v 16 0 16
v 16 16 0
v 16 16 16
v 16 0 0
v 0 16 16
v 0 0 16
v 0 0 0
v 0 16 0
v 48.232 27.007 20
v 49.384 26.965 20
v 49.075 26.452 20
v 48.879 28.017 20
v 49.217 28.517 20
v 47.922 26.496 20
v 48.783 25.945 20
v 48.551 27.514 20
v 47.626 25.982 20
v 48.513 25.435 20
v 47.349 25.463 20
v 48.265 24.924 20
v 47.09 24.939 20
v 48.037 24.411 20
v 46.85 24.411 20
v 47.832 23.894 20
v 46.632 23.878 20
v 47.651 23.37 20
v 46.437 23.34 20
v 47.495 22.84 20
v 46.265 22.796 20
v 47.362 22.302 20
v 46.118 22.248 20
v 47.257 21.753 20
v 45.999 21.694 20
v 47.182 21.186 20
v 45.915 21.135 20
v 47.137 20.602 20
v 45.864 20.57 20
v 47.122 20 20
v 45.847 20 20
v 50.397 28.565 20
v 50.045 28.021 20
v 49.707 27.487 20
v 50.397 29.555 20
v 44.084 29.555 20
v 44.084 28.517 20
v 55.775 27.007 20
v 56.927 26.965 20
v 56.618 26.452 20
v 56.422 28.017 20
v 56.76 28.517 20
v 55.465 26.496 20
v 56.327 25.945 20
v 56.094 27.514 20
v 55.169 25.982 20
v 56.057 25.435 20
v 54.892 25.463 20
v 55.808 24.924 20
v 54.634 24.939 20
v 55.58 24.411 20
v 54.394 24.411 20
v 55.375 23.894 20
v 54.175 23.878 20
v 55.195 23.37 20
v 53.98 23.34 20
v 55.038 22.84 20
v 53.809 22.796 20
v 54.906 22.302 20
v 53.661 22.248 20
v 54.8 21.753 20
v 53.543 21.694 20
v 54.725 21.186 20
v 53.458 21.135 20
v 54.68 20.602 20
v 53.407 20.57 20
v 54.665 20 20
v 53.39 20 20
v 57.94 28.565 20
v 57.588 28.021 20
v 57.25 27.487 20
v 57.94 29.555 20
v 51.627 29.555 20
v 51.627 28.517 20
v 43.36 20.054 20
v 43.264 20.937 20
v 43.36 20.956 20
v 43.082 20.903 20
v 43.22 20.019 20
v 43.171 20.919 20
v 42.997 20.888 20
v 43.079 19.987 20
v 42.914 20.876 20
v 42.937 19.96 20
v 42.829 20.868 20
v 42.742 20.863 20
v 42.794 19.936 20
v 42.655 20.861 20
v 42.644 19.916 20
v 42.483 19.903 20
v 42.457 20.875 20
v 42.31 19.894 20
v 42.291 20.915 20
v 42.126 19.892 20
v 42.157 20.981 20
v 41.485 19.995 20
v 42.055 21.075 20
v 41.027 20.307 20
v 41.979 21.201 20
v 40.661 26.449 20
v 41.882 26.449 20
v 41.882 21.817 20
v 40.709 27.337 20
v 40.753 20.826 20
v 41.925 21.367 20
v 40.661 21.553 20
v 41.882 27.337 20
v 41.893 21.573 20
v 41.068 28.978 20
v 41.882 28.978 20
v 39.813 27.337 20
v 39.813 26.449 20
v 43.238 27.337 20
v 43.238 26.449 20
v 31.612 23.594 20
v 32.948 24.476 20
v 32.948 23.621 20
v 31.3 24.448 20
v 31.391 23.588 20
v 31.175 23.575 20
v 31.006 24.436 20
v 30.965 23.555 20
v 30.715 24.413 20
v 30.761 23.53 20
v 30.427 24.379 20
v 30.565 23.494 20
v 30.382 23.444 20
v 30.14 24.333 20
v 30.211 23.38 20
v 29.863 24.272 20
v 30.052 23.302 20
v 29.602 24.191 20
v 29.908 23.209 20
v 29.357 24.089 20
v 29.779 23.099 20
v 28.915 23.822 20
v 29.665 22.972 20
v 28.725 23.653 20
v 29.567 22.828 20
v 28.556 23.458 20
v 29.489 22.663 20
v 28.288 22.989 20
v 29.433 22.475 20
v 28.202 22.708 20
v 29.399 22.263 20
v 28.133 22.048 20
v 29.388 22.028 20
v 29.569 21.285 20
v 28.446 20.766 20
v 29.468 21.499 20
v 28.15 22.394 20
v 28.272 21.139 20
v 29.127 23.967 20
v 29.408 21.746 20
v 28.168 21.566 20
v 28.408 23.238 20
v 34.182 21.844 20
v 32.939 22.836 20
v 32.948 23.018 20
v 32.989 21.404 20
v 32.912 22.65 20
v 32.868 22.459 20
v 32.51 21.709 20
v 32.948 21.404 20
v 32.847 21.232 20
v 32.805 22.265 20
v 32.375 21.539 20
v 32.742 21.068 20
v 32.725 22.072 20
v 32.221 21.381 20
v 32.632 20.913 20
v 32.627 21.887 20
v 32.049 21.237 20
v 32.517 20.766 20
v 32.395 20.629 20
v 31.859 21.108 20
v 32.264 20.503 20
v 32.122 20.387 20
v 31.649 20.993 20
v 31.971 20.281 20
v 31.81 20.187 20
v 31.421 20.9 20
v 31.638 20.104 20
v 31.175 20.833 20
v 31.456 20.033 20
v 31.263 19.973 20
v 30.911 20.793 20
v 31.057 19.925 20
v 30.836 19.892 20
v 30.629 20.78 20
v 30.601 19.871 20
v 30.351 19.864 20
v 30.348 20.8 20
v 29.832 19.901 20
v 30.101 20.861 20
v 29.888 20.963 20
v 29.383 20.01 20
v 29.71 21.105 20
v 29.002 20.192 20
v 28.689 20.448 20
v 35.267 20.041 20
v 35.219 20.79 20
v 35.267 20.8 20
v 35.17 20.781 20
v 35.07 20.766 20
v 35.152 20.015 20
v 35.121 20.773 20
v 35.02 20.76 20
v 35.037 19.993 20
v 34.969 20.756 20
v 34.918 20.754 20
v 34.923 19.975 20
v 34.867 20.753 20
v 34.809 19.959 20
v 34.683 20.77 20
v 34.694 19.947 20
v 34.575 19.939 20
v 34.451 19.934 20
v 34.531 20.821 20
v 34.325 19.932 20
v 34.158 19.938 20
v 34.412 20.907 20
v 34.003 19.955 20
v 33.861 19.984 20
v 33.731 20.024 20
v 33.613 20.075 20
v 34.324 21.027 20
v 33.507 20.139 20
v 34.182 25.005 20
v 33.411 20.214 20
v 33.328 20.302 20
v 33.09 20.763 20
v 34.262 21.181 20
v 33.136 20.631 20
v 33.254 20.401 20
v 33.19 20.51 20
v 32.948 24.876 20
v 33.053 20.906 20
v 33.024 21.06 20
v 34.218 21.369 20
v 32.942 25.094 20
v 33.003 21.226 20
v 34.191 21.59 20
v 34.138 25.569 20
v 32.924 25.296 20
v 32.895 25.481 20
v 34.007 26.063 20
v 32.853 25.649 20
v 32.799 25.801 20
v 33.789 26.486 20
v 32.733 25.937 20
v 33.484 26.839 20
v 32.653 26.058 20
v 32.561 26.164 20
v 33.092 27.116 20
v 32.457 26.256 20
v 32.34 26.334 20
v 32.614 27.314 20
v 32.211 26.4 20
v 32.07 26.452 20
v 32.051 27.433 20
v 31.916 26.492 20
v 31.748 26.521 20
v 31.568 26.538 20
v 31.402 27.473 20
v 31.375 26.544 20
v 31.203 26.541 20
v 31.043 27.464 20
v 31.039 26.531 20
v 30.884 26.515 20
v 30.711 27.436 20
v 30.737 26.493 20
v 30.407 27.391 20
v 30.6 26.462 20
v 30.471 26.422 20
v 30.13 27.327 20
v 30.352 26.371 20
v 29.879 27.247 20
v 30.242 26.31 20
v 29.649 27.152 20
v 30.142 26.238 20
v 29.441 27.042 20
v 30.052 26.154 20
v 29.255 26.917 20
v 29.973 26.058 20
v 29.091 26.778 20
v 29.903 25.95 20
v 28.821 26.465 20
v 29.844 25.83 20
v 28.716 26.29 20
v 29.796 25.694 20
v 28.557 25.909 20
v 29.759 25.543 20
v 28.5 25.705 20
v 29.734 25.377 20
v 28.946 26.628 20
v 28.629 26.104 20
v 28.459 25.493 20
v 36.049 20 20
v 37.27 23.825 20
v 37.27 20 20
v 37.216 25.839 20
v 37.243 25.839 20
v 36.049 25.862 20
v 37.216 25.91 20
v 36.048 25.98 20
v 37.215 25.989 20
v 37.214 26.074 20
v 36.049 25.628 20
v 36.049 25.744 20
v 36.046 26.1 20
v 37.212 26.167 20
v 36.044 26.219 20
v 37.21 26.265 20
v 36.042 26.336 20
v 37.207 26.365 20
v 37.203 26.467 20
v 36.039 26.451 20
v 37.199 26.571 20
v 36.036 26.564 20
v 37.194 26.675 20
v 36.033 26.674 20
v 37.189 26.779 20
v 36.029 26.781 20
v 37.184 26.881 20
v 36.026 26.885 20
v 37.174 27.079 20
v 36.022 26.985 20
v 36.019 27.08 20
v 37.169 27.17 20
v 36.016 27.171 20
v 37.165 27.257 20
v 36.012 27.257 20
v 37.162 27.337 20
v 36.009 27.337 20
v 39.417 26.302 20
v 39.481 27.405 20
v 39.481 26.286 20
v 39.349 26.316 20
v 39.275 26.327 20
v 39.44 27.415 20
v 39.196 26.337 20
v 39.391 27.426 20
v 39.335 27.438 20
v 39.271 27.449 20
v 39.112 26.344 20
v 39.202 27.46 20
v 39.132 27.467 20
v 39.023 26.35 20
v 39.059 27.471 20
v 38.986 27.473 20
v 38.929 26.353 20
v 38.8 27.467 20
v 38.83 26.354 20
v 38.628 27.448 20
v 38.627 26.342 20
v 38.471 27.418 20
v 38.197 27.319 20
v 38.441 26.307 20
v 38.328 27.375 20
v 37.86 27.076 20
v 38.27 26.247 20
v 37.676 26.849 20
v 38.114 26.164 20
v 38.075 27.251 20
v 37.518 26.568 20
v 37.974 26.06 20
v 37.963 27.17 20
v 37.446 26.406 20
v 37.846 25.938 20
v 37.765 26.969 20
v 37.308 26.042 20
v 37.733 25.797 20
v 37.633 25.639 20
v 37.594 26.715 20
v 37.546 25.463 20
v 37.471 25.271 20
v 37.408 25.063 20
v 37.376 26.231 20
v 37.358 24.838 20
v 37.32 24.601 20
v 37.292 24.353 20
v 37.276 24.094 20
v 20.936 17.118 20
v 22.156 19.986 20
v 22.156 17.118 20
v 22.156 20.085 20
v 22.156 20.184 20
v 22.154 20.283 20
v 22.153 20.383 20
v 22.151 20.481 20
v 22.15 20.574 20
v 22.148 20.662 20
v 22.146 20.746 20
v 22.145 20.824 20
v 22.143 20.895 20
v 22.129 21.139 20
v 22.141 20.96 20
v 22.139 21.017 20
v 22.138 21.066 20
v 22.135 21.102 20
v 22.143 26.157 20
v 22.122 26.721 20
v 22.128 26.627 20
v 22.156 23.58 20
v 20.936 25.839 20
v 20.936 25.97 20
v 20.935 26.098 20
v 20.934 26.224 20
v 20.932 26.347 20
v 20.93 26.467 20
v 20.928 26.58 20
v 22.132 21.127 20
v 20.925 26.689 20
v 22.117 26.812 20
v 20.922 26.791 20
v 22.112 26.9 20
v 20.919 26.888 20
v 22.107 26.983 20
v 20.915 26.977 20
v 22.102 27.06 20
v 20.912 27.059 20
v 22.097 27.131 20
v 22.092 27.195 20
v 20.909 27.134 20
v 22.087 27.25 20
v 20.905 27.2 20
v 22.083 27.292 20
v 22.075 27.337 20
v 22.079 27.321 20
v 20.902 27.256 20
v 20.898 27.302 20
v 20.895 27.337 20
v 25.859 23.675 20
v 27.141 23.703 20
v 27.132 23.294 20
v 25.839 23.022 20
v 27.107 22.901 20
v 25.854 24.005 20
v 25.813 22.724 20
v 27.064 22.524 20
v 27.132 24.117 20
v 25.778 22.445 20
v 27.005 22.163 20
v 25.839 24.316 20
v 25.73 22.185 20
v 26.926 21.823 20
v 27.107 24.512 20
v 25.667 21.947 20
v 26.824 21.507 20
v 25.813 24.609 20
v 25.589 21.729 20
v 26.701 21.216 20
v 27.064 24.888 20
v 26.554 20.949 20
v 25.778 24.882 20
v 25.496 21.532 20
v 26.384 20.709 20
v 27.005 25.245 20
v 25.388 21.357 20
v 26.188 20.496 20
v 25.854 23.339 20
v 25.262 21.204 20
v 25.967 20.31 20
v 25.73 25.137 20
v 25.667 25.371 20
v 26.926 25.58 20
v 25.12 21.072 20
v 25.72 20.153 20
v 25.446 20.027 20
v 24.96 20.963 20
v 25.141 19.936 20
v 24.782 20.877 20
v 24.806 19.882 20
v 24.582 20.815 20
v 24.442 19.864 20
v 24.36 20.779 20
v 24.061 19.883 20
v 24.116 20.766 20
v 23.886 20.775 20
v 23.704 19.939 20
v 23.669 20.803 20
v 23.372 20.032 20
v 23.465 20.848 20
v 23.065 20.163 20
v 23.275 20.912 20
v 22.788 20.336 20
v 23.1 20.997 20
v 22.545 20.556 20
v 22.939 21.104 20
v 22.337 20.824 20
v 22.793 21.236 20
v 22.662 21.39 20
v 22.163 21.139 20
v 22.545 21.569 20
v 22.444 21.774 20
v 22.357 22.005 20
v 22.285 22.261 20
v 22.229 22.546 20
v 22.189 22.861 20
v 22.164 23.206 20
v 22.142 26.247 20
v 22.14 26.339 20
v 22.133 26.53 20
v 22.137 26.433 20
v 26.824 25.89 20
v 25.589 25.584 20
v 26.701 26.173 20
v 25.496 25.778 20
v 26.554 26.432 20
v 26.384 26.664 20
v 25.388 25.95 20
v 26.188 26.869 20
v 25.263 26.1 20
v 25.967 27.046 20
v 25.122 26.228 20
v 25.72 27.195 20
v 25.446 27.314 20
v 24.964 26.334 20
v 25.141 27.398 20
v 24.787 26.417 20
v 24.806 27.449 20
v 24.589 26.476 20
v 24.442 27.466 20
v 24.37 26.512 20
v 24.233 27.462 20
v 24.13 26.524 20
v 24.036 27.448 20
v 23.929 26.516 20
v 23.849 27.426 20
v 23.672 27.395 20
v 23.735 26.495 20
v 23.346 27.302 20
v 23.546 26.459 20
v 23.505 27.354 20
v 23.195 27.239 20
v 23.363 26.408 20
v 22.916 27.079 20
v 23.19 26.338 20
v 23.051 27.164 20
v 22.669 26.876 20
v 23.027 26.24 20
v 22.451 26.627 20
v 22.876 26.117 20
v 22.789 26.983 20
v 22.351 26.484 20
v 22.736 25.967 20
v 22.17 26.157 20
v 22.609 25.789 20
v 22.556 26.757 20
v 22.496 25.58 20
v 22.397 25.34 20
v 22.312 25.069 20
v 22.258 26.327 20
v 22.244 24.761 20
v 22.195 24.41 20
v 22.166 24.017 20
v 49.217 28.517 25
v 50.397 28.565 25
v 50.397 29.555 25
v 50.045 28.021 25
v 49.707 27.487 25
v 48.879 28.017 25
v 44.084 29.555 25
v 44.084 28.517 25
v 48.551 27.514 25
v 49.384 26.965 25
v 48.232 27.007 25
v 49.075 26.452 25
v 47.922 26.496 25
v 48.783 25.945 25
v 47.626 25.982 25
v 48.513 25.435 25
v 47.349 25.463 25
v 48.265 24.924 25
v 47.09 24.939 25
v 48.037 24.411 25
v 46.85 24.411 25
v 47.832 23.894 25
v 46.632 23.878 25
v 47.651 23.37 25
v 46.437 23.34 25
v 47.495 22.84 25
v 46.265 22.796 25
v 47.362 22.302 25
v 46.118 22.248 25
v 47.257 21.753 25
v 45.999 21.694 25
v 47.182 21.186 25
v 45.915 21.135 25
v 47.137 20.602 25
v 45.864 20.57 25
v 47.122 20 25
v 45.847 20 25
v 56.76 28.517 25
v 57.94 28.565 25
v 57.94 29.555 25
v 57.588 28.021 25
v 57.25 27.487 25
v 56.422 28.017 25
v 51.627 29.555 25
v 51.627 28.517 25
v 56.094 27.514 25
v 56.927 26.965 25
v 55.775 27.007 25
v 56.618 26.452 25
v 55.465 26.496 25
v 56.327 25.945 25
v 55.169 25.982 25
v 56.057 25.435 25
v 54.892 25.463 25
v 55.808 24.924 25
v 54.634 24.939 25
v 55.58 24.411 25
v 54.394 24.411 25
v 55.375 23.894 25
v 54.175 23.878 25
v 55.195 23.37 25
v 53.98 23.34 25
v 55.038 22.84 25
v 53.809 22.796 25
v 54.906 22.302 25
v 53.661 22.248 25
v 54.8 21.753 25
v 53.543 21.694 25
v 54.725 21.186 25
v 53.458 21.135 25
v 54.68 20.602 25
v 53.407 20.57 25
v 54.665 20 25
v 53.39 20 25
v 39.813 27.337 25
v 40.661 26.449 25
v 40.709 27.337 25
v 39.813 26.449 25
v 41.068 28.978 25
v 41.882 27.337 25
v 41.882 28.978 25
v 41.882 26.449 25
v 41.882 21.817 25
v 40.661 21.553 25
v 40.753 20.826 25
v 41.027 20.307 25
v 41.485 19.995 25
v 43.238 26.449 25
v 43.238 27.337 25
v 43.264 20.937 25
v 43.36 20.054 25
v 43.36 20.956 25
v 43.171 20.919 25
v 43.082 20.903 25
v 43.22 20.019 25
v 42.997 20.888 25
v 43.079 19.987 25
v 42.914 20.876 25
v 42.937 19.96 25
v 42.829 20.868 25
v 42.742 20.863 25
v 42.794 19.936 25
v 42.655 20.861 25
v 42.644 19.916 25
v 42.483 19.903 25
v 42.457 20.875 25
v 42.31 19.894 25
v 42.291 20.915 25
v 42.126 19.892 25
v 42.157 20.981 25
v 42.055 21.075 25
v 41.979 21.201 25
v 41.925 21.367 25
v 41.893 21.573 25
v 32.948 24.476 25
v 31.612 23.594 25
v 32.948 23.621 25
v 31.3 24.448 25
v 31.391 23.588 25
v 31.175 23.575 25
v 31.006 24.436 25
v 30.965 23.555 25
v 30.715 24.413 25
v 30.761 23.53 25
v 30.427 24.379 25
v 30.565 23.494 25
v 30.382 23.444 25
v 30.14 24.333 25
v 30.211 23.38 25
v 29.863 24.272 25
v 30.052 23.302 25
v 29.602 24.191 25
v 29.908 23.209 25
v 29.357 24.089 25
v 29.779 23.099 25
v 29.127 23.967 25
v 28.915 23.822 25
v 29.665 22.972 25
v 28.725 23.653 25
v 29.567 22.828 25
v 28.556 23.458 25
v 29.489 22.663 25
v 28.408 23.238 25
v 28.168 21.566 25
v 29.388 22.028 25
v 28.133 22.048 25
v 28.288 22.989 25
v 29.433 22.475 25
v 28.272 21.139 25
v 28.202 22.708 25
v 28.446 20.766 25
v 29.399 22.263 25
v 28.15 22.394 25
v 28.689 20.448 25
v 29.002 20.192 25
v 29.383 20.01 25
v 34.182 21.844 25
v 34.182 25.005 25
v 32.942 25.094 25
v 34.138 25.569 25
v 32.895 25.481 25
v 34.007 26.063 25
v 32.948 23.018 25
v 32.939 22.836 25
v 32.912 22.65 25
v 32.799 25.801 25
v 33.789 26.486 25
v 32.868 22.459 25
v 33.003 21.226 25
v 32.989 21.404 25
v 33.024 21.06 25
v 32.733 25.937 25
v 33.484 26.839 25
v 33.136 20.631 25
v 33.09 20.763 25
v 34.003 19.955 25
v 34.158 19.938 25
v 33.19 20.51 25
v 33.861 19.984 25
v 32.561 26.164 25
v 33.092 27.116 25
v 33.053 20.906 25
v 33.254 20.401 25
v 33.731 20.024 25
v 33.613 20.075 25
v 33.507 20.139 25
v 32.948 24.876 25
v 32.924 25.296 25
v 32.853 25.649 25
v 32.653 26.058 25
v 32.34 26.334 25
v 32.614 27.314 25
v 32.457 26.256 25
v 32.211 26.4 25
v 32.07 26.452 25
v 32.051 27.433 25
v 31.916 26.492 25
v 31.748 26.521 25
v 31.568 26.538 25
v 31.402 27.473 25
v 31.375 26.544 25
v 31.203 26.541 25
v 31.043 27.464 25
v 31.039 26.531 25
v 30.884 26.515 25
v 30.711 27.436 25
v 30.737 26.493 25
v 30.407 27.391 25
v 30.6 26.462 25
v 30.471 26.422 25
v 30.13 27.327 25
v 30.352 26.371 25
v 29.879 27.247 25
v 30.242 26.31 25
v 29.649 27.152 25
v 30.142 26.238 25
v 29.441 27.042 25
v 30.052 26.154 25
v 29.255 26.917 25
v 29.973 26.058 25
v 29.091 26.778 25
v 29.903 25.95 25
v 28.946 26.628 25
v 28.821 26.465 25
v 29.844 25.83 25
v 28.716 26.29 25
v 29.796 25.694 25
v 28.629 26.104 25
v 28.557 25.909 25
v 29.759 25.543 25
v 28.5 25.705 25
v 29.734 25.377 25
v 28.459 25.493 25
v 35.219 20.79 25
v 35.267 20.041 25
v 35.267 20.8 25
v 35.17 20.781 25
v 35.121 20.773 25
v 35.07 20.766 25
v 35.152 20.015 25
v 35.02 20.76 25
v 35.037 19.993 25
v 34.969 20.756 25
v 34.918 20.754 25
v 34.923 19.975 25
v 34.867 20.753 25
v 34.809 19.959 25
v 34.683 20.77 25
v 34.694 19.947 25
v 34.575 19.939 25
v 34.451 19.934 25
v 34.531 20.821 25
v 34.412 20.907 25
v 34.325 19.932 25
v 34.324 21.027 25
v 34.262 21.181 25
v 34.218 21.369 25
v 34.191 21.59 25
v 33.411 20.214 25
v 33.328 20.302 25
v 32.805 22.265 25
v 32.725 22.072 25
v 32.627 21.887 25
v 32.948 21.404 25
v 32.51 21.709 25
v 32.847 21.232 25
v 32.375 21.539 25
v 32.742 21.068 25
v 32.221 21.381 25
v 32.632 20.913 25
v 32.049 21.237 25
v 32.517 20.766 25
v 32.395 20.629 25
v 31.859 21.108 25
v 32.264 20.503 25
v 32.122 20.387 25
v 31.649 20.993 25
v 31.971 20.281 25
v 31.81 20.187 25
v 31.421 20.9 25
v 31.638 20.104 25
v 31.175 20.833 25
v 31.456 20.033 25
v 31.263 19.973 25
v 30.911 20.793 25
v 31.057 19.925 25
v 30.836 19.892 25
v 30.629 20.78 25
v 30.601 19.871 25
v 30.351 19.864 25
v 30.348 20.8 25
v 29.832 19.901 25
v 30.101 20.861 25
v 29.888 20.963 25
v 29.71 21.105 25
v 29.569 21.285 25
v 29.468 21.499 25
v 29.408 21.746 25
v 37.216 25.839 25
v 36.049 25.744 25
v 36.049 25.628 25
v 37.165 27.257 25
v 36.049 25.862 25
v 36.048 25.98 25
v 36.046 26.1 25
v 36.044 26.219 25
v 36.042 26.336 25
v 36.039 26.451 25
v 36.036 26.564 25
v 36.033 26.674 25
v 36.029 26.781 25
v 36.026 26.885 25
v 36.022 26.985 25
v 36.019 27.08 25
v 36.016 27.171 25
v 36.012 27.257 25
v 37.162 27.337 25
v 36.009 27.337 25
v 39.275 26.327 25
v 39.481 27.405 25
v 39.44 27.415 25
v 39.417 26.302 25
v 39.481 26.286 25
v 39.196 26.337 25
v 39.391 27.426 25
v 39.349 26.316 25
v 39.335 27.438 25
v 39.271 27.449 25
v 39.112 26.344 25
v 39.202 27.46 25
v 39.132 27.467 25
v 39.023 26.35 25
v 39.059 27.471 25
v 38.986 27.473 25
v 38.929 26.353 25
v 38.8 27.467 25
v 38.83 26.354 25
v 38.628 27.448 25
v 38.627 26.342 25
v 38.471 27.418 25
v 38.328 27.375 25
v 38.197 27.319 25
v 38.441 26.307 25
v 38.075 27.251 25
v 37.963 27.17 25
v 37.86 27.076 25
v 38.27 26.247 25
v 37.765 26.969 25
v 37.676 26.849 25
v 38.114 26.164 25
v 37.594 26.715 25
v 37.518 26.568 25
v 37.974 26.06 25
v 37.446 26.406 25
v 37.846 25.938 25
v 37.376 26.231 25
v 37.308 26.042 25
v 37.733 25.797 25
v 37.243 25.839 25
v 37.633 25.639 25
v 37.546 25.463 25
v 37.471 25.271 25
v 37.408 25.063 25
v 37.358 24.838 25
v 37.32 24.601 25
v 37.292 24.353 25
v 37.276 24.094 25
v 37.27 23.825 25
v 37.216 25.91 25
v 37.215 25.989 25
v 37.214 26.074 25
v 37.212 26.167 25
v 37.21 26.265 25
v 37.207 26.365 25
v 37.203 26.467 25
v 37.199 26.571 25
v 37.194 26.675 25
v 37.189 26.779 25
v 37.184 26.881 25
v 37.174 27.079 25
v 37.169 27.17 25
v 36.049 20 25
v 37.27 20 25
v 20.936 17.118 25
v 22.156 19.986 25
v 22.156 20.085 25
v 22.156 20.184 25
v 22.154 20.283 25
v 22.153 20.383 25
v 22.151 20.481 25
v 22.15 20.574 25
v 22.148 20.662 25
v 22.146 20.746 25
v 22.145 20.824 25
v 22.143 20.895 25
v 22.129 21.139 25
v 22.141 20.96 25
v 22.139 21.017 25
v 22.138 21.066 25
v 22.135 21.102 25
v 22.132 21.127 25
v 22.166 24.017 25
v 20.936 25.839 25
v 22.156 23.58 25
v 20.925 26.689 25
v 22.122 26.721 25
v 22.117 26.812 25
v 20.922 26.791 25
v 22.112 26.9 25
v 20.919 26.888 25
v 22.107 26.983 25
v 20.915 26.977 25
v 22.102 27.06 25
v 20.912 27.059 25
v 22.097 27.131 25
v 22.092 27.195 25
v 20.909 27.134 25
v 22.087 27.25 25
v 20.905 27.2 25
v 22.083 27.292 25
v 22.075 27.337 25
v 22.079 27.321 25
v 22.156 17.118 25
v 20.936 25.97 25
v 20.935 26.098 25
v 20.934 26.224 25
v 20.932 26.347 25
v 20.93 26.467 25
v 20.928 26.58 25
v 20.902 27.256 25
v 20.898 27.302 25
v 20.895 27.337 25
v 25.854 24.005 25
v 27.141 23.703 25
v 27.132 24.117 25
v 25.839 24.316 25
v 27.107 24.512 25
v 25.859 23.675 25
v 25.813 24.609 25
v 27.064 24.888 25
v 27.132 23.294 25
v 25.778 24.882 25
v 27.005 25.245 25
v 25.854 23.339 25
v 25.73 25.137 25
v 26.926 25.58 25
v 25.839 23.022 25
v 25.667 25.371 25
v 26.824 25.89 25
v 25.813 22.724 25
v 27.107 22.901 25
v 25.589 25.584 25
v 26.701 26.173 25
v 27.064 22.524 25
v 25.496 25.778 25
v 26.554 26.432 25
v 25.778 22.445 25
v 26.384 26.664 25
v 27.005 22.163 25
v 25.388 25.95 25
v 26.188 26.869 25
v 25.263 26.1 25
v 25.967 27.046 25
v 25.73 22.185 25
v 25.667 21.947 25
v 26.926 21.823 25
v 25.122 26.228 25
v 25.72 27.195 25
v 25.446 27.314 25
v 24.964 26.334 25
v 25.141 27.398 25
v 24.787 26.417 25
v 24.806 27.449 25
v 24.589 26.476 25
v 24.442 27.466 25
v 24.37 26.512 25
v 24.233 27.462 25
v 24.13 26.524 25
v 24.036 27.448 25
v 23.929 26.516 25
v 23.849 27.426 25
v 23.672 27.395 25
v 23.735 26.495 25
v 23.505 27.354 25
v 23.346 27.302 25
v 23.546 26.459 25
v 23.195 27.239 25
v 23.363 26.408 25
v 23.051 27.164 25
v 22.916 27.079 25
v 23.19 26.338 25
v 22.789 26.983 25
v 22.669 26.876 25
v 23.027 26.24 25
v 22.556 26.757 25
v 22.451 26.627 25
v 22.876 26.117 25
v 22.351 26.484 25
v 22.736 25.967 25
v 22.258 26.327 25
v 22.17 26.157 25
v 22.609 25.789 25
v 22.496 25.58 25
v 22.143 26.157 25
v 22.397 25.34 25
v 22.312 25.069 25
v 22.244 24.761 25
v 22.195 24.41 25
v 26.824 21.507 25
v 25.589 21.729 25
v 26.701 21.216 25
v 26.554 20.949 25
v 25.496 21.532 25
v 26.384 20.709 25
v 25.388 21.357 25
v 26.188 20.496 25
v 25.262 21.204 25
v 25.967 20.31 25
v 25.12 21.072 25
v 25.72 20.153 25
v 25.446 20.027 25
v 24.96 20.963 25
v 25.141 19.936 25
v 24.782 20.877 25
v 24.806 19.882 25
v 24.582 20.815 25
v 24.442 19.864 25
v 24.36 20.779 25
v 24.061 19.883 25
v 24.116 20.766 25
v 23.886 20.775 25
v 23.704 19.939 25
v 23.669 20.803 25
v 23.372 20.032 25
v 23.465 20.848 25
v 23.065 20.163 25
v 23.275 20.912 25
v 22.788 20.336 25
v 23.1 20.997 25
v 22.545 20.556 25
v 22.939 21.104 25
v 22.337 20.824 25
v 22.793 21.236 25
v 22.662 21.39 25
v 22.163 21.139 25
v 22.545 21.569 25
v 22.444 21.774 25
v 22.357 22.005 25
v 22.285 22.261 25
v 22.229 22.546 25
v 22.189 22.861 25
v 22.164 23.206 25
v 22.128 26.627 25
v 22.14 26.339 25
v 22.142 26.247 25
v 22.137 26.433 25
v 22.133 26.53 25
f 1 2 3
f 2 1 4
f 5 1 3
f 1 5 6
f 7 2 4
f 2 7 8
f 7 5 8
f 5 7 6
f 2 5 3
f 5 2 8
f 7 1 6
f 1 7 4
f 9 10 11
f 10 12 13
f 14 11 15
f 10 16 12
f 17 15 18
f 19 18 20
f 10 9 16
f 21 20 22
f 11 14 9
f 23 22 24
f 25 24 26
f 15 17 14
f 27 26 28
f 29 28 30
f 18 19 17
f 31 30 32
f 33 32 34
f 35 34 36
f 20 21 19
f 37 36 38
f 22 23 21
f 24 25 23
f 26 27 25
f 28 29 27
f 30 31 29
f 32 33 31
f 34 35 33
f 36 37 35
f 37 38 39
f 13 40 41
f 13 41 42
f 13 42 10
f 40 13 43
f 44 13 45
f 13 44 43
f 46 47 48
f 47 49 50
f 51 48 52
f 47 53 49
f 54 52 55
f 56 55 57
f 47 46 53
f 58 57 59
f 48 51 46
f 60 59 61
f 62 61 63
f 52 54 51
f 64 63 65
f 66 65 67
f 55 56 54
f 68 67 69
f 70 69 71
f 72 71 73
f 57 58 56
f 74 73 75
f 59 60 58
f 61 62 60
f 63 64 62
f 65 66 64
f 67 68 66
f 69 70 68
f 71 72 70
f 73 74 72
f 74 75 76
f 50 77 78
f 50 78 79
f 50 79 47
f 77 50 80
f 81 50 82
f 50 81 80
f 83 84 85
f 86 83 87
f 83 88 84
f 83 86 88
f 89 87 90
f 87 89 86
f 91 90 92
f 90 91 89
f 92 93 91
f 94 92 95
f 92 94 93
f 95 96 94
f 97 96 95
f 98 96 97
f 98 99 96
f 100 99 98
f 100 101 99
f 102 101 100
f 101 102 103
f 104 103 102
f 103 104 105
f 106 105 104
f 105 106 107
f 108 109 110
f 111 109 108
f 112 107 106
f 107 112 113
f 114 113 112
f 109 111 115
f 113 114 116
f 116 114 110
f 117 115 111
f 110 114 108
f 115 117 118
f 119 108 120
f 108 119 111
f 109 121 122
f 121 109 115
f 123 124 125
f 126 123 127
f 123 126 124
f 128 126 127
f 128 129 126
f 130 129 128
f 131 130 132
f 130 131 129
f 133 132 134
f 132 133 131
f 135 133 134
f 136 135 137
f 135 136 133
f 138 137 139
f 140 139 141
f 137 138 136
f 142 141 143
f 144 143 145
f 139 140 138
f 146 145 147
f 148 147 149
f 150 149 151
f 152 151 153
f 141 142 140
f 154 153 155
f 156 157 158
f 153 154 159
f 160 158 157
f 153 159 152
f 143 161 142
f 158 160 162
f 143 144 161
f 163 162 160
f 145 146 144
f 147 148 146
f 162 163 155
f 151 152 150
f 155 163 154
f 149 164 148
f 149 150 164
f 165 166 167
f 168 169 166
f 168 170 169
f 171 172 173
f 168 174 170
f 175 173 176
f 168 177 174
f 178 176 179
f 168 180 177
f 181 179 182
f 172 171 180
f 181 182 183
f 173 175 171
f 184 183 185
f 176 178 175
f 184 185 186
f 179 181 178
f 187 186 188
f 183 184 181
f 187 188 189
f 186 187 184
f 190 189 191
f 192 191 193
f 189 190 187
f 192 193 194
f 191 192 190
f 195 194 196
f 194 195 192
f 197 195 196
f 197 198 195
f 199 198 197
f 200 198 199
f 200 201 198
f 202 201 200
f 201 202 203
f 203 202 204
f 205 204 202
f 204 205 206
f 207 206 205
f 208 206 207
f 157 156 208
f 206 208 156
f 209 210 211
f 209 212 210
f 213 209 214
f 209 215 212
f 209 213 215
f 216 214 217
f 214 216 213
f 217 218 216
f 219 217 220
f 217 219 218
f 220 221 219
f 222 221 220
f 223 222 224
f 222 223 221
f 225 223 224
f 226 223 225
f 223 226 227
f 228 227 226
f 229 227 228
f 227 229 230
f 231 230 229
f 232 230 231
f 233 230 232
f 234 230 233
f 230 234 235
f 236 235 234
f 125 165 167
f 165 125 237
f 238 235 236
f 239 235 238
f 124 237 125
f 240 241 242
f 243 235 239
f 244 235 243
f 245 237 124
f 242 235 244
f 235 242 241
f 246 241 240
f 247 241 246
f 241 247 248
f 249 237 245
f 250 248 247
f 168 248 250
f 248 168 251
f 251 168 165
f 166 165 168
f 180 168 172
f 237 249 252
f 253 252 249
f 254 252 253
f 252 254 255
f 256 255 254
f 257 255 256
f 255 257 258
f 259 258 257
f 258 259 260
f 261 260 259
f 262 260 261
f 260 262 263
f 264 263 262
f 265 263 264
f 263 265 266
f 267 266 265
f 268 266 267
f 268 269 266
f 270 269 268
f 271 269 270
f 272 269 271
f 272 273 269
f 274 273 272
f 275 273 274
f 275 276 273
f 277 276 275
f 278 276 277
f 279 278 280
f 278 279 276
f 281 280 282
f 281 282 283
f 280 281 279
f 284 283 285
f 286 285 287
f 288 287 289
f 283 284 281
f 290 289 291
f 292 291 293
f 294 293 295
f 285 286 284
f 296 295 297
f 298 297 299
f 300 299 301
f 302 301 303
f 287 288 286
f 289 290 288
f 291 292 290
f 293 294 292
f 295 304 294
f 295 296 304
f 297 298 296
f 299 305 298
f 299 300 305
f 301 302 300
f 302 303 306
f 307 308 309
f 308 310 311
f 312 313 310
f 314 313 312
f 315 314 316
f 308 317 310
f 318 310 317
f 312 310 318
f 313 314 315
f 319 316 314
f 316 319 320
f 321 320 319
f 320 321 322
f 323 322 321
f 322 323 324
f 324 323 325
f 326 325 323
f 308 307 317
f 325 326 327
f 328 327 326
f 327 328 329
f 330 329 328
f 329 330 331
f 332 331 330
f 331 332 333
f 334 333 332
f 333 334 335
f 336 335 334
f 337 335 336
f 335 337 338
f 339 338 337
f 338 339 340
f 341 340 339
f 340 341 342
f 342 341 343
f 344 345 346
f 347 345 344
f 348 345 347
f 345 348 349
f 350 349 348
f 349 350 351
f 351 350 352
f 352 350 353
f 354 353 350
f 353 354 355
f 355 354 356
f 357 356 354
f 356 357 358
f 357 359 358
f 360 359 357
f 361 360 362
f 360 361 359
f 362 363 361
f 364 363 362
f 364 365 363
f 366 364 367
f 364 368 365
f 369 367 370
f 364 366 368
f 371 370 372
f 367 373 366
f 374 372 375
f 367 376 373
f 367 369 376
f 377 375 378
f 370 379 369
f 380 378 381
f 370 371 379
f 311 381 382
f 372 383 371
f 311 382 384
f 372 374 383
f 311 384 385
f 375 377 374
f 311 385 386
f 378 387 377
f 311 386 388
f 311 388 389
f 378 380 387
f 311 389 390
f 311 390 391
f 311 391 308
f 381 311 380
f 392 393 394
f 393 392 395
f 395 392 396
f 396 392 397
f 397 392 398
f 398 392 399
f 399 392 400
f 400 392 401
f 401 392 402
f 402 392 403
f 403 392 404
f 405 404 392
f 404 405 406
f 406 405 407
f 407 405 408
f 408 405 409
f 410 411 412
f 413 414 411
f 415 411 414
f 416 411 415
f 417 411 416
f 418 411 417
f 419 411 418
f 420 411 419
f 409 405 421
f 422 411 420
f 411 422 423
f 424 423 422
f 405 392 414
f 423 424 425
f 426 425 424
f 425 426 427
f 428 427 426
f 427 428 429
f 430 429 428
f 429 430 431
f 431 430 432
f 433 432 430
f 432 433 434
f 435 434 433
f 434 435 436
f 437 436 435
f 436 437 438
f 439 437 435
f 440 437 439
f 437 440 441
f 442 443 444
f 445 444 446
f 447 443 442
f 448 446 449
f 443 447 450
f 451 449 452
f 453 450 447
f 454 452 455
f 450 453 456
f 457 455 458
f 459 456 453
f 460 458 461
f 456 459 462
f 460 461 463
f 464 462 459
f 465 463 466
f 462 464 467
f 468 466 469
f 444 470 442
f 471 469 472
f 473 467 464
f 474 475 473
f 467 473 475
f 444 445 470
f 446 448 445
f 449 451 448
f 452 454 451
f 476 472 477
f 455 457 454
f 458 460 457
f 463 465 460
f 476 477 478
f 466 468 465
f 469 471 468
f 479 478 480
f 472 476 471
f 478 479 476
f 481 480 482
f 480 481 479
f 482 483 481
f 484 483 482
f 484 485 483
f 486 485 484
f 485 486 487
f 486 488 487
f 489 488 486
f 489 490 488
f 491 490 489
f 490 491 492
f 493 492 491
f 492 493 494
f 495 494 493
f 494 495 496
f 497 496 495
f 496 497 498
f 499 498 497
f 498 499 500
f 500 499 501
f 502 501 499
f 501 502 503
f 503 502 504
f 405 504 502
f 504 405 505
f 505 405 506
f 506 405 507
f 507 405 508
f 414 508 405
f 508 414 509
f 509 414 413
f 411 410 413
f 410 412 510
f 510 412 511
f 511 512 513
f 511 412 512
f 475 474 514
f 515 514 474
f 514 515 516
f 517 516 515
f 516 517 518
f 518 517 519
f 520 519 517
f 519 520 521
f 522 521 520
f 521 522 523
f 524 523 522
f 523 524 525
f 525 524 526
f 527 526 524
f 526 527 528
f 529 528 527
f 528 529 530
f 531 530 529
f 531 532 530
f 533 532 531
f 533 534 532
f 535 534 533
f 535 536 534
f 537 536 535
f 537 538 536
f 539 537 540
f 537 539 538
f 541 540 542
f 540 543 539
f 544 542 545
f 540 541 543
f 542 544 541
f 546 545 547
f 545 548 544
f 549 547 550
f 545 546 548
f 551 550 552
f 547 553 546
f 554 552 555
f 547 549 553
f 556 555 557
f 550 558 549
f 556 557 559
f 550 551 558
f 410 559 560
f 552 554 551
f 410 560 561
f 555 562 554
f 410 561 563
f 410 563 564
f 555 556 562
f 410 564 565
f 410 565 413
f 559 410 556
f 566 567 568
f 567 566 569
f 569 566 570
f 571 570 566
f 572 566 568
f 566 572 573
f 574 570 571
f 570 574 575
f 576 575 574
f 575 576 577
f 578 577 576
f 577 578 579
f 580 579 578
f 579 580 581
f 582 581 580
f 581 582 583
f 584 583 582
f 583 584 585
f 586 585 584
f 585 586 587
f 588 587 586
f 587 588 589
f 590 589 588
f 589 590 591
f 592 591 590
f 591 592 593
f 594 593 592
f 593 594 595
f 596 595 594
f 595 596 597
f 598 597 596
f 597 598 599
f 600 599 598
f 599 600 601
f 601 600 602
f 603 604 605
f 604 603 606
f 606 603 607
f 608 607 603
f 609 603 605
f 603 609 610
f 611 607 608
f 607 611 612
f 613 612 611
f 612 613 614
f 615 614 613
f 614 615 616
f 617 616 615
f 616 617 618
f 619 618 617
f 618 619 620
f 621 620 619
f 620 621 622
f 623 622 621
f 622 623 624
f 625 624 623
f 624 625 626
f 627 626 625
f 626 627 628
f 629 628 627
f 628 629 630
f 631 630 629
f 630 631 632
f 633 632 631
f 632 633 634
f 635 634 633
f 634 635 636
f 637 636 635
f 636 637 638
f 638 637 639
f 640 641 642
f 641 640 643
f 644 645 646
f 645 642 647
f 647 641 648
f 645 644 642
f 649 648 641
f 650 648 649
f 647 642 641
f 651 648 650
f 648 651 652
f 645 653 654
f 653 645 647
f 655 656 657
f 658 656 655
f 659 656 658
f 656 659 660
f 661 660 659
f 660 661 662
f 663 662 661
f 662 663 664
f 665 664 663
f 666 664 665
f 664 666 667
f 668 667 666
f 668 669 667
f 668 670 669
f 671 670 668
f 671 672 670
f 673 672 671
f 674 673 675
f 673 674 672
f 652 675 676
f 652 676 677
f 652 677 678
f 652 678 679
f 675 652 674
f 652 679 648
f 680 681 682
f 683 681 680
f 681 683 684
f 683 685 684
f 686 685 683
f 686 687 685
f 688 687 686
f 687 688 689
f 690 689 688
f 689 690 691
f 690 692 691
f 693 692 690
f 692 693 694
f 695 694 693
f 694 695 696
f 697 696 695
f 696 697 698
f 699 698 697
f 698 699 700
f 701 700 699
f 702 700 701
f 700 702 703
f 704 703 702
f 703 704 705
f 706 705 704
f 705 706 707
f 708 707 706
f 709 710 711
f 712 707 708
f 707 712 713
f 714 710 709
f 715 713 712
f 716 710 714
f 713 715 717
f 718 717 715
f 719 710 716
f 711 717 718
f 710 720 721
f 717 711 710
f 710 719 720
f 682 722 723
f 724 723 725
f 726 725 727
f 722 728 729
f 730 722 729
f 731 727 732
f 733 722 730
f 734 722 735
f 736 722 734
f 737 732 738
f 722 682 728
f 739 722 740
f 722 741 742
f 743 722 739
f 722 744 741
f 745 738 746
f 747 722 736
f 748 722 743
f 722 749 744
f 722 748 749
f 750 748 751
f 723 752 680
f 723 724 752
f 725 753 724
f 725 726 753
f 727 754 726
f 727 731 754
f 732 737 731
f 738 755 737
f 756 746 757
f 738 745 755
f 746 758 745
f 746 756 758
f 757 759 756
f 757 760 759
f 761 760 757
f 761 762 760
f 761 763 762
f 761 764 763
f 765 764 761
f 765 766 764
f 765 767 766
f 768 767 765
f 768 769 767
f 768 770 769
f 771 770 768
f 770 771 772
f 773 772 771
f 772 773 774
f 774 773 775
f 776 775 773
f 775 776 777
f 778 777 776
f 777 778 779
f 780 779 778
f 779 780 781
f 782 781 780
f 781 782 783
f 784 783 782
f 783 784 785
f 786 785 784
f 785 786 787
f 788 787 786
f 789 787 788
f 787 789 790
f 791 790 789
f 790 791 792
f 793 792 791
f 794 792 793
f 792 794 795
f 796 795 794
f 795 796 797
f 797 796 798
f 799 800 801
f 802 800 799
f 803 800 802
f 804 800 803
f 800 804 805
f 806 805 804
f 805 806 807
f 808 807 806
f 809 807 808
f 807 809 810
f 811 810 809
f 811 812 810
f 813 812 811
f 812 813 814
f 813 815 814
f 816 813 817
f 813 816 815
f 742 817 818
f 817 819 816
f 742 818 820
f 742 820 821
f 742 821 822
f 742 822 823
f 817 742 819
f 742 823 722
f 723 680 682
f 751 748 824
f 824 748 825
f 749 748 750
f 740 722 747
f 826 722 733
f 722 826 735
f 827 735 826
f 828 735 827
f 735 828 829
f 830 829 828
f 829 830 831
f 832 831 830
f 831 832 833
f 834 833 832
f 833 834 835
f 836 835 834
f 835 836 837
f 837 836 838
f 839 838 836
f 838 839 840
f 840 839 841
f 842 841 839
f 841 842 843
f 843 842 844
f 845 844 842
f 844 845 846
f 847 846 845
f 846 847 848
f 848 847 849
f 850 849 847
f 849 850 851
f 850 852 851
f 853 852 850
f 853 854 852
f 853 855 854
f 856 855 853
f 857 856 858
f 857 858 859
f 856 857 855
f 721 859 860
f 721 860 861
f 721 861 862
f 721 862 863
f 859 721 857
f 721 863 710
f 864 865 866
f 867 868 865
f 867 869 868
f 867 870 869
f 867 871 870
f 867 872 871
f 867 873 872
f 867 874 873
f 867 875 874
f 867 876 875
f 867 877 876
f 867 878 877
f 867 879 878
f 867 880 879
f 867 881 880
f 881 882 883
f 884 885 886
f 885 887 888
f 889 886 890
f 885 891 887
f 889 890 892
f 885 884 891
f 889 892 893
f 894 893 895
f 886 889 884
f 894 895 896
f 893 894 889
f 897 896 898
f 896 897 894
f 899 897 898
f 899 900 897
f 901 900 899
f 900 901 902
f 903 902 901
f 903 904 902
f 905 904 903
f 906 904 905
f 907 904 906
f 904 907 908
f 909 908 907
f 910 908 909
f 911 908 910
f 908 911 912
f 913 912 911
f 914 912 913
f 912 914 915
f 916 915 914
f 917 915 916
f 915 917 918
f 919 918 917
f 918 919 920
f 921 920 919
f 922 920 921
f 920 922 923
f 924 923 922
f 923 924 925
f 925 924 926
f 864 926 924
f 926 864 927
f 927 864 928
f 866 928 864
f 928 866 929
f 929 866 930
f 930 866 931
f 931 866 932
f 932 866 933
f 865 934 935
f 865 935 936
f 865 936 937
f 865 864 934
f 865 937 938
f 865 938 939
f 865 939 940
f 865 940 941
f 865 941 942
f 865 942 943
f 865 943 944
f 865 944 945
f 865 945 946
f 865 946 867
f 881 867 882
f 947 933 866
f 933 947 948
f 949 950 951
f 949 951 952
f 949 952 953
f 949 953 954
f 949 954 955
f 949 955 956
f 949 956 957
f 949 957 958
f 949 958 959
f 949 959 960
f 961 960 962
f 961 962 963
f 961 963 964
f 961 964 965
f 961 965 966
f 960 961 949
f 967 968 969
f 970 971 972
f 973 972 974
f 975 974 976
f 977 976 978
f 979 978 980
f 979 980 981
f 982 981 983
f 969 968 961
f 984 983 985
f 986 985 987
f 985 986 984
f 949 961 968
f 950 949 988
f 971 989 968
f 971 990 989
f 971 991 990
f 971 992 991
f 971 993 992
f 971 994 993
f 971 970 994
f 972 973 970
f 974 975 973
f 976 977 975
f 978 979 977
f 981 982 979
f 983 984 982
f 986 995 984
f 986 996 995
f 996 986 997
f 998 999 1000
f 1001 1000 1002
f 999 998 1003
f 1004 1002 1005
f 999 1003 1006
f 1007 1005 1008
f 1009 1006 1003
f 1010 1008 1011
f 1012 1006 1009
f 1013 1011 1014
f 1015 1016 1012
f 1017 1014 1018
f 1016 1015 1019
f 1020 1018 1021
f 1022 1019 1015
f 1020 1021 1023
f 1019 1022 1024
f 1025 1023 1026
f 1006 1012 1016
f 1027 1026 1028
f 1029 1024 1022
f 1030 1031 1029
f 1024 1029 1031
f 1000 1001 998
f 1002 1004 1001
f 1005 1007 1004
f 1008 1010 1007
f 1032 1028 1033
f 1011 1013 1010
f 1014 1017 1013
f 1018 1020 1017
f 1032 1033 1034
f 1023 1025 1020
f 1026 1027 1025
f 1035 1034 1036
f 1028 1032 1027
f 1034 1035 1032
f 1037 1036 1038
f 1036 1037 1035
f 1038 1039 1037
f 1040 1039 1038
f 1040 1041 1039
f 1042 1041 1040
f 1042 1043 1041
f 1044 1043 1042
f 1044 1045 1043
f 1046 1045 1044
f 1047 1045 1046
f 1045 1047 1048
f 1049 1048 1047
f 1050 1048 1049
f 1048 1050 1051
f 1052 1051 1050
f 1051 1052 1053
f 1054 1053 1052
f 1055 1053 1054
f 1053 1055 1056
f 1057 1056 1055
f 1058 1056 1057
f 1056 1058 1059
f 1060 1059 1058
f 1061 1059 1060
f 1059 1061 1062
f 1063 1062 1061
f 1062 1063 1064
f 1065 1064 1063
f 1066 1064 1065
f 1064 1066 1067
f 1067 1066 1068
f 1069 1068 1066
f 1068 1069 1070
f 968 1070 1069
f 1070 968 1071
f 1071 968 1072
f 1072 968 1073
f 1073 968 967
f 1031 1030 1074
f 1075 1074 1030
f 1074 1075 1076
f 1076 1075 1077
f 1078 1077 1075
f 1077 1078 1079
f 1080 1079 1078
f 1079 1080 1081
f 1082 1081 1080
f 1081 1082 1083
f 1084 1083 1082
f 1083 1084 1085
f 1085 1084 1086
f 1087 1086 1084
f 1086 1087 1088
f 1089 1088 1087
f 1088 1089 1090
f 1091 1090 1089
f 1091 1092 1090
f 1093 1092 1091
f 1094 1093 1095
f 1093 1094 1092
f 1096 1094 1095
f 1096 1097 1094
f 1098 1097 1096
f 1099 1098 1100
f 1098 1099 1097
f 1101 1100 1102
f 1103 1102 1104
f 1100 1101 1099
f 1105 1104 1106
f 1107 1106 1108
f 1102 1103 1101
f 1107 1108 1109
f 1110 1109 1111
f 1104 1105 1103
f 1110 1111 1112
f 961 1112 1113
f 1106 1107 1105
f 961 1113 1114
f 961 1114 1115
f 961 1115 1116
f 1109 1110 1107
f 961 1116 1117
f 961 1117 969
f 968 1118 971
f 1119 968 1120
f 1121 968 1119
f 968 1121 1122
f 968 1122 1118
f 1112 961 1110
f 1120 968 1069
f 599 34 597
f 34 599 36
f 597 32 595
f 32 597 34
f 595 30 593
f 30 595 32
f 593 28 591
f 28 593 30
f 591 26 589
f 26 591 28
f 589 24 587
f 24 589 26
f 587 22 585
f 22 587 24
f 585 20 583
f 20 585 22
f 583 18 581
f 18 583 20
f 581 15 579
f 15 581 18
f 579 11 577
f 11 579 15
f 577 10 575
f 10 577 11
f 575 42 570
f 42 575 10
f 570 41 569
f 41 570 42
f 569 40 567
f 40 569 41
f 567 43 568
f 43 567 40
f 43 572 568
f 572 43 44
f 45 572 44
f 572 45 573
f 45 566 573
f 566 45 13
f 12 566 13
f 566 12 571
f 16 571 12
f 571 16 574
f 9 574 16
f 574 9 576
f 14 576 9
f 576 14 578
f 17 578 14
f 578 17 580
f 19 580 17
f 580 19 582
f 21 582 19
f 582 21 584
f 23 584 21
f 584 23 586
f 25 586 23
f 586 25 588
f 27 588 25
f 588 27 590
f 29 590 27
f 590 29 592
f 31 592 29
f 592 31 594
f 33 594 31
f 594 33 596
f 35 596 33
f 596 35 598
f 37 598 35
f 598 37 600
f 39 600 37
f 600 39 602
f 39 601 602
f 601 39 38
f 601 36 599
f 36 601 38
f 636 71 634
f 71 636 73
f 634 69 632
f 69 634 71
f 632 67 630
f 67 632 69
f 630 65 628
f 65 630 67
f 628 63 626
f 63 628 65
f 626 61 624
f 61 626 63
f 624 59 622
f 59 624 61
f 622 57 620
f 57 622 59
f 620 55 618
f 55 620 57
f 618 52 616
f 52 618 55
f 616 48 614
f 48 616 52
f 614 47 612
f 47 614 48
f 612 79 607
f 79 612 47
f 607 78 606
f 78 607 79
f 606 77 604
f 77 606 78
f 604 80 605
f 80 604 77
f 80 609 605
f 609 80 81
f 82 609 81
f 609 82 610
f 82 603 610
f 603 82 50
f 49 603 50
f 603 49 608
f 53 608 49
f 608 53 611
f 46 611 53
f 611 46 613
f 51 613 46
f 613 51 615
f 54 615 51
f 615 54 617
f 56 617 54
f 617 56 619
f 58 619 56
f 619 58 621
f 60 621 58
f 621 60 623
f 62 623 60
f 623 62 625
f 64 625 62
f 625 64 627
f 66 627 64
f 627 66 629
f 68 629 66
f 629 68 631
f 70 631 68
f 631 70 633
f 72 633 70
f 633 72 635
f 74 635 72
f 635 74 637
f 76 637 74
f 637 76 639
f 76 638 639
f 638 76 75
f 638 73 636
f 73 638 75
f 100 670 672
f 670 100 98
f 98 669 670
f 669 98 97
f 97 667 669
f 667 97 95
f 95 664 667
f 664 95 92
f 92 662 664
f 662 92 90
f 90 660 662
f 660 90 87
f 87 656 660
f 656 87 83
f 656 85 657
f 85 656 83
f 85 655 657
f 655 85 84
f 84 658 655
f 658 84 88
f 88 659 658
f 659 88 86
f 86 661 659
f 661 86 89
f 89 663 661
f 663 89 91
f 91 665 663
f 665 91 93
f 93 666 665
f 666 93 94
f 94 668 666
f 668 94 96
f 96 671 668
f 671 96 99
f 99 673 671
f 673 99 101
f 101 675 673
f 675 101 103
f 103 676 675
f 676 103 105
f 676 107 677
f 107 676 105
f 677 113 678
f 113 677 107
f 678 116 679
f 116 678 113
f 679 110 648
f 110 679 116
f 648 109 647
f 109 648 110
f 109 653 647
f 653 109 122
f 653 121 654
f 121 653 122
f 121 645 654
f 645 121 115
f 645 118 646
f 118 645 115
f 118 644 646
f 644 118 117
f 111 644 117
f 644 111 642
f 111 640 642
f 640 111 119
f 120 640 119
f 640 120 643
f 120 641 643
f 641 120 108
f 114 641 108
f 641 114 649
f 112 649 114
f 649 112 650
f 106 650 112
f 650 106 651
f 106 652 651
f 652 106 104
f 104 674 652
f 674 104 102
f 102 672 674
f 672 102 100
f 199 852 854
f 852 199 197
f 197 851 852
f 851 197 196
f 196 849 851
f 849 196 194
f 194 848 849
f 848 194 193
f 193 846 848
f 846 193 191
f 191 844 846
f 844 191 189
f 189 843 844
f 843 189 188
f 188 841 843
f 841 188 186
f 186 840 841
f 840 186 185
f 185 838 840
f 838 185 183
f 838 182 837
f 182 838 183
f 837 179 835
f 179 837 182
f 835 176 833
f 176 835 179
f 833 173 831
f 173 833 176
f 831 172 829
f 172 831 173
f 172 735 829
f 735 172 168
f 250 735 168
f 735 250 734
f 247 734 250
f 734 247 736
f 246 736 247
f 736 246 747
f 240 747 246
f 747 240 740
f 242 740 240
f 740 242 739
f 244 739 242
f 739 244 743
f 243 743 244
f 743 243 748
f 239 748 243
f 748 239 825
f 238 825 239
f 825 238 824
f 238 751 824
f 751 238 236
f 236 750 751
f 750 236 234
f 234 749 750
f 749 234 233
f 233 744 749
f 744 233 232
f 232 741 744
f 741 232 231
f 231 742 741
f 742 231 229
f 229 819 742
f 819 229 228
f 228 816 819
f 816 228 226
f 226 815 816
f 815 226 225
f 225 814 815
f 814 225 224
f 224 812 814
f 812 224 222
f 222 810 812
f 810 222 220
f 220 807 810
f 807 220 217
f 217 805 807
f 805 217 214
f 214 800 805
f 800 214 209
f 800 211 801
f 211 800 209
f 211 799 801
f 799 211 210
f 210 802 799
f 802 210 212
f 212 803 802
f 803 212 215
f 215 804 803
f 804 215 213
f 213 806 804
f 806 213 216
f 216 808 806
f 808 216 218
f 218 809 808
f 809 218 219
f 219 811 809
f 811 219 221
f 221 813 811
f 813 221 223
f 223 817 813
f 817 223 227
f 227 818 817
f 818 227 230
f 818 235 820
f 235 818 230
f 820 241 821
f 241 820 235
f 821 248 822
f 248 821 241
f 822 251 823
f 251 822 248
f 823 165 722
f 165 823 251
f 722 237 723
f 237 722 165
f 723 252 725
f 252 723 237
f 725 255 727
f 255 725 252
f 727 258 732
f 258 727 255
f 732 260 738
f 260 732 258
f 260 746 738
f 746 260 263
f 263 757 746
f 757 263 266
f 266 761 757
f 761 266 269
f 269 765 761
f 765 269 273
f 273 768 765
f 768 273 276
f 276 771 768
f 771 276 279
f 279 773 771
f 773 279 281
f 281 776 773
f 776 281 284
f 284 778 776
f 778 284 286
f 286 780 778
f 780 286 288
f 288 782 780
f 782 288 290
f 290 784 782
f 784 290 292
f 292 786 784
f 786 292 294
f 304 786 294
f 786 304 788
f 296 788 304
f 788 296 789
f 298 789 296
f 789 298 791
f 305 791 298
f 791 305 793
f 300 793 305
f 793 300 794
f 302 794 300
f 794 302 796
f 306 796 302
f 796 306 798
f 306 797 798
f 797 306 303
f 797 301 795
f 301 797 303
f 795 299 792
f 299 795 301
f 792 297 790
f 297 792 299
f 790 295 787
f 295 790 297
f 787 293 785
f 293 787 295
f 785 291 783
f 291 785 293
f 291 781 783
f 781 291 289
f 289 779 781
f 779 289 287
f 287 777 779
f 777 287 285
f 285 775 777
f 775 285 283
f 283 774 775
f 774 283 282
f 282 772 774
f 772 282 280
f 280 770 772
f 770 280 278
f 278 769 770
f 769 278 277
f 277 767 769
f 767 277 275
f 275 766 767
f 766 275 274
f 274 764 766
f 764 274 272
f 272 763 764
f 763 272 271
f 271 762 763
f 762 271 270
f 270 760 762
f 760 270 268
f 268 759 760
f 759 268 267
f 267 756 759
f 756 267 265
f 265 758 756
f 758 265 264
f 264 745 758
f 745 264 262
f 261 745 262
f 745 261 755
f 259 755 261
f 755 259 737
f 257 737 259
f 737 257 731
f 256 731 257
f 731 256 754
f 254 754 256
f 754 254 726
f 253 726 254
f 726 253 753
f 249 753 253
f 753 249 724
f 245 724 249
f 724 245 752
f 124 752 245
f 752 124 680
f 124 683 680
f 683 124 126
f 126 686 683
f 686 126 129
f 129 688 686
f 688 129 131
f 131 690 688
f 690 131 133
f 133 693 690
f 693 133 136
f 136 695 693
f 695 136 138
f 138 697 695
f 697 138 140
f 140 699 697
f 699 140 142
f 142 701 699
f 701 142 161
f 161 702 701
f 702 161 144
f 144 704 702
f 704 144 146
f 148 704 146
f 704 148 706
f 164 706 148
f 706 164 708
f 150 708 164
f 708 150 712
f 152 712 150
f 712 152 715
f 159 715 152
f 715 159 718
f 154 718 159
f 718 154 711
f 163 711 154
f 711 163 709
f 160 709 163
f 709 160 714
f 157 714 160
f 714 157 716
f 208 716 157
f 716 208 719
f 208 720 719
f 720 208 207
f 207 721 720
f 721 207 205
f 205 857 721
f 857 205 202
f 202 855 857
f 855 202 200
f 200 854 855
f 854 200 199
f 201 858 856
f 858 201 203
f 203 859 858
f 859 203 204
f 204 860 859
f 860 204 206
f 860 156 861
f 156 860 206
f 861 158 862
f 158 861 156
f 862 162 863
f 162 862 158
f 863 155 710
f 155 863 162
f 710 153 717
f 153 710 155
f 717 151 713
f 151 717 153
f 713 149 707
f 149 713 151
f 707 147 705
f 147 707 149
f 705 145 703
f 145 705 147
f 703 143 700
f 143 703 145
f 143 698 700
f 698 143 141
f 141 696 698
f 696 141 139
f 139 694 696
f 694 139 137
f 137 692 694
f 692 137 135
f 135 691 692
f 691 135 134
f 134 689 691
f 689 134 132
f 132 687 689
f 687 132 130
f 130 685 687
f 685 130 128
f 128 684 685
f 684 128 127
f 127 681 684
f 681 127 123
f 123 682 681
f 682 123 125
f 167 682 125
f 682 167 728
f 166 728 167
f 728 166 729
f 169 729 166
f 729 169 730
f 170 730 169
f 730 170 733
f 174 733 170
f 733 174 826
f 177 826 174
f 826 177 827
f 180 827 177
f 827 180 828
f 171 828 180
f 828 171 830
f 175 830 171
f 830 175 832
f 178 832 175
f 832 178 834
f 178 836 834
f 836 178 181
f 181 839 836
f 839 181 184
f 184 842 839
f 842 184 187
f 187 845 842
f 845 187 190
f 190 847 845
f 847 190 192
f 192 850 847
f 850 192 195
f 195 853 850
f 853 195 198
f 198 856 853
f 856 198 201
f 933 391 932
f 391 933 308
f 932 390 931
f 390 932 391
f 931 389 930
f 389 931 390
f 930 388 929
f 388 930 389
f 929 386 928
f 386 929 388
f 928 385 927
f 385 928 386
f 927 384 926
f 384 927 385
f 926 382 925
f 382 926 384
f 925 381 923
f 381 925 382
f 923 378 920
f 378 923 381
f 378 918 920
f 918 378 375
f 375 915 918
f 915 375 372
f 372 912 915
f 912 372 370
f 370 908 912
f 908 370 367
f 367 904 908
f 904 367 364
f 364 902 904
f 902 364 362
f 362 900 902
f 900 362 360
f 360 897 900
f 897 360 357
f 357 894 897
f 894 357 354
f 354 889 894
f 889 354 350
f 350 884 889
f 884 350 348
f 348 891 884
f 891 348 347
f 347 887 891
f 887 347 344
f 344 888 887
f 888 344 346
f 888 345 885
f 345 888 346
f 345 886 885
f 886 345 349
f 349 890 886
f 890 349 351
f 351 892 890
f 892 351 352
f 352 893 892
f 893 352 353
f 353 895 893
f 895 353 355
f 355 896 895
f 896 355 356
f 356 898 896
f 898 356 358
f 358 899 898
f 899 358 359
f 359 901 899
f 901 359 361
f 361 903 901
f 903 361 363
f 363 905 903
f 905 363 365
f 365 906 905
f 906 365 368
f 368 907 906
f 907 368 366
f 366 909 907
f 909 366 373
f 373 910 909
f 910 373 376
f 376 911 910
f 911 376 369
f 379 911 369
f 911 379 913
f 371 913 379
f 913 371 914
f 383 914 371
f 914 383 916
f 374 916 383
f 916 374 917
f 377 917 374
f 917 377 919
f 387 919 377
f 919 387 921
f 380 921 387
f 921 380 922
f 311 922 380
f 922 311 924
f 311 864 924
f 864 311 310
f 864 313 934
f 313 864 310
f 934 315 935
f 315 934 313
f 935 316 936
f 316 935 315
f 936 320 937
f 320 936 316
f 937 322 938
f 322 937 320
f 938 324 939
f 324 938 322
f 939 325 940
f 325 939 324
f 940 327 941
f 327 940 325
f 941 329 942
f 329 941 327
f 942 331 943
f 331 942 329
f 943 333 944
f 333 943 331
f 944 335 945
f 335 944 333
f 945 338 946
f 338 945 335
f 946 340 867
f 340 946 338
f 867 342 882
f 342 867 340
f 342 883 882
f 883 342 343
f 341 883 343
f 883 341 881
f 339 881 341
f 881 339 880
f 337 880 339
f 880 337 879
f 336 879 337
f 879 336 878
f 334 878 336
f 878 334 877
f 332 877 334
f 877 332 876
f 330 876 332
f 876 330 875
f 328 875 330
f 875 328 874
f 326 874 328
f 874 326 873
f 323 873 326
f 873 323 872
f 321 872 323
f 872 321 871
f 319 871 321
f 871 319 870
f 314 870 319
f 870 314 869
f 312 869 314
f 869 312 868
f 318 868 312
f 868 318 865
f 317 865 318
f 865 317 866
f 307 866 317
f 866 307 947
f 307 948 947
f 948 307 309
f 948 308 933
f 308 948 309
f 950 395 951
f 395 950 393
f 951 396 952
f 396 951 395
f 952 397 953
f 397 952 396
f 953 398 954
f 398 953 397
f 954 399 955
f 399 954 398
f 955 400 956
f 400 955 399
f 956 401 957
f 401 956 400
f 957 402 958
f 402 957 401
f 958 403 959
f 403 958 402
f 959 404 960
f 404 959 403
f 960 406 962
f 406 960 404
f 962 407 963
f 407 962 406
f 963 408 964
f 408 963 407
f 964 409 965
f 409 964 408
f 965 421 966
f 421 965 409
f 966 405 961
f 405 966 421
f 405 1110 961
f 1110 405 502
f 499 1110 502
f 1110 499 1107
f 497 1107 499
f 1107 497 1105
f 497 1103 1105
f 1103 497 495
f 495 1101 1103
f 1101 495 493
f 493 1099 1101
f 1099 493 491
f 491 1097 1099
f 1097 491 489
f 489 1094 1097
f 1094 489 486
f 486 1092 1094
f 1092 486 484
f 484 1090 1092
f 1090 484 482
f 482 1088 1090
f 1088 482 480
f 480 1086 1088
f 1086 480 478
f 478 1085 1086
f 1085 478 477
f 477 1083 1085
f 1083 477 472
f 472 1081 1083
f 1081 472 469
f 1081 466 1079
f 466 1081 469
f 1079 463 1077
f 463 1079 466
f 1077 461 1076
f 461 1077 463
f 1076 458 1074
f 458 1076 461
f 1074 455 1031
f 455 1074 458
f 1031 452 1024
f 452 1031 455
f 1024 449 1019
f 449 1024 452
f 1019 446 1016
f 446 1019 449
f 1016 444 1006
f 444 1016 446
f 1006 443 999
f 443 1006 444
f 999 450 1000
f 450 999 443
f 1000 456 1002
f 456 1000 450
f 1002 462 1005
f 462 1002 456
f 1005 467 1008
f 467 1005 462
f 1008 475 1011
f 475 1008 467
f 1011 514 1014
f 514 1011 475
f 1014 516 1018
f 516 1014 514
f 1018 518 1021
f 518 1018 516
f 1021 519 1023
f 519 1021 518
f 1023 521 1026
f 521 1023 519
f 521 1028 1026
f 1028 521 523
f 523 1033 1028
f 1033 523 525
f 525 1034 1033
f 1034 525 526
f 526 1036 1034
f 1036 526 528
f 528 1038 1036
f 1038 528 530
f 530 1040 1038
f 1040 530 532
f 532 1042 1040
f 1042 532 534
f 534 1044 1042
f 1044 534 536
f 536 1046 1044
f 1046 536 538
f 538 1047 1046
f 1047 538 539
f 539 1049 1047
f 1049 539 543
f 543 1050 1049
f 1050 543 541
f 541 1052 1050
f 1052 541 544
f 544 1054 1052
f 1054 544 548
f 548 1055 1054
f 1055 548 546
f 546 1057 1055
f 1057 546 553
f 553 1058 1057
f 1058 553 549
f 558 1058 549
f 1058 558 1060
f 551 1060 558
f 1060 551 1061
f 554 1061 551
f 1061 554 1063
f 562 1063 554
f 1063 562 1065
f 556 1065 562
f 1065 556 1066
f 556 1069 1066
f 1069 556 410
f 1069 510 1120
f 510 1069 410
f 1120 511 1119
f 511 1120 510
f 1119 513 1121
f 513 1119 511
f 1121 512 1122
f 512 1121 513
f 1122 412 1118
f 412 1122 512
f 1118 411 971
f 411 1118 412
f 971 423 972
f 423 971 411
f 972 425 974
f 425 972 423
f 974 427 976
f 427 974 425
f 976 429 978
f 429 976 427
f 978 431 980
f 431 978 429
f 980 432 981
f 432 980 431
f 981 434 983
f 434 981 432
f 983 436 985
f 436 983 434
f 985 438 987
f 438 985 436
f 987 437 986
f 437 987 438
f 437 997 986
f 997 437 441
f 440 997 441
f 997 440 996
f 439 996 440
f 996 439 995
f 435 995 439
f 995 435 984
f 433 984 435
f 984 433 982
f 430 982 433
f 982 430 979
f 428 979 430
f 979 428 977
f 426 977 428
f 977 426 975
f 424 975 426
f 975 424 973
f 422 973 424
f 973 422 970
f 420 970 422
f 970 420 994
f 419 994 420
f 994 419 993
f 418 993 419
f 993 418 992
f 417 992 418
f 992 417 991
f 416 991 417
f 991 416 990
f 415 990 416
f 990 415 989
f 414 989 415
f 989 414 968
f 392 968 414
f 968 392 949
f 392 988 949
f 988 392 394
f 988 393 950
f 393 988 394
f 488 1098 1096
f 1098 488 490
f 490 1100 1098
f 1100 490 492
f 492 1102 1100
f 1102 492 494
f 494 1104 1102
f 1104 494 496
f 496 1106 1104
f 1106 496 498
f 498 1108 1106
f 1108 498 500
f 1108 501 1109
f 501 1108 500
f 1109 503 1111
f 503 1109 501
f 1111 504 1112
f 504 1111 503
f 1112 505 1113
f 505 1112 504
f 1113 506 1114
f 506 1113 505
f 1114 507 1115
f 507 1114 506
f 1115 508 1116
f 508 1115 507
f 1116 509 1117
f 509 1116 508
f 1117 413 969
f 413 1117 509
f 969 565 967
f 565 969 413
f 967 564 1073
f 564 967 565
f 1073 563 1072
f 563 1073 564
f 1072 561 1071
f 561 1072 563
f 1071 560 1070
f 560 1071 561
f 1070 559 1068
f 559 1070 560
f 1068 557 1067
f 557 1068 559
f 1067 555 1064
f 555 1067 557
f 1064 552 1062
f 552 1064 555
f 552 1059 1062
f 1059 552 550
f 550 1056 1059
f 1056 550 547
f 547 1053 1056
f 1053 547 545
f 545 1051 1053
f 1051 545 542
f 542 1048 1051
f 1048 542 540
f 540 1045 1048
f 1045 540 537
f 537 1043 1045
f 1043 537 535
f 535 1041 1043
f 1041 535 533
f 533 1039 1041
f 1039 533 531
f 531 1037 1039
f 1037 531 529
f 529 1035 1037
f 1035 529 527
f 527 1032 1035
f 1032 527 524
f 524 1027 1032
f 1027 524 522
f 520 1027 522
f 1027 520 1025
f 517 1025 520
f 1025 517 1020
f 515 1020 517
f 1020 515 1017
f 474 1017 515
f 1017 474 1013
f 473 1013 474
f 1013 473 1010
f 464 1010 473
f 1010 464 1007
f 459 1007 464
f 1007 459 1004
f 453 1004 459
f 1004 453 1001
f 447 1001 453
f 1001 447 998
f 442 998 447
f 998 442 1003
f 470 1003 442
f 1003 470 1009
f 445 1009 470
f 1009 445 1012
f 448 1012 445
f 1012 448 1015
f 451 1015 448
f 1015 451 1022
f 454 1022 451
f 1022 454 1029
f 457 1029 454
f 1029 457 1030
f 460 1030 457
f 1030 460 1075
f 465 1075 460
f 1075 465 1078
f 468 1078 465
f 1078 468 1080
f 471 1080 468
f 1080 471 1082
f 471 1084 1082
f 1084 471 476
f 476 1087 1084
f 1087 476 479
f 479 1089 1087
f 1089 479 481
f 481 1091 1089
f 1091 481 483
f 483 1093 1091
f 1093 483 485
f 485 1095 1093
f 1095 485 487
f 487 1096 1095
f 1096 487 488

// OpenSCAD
//[CUSTOMIZATION]
// X Dimension
xdim=16;
// Y Dimension
ydim=14;
// Z Dimension
zdim=18;
// Message
txt="part77";
module __END_CUSTOMIZATIONS () {}
cube(xdim,ydim,zdim);
translate([20,20,20]) { linear_extrude(5) text(txt, font="Liberation Sans"); }
